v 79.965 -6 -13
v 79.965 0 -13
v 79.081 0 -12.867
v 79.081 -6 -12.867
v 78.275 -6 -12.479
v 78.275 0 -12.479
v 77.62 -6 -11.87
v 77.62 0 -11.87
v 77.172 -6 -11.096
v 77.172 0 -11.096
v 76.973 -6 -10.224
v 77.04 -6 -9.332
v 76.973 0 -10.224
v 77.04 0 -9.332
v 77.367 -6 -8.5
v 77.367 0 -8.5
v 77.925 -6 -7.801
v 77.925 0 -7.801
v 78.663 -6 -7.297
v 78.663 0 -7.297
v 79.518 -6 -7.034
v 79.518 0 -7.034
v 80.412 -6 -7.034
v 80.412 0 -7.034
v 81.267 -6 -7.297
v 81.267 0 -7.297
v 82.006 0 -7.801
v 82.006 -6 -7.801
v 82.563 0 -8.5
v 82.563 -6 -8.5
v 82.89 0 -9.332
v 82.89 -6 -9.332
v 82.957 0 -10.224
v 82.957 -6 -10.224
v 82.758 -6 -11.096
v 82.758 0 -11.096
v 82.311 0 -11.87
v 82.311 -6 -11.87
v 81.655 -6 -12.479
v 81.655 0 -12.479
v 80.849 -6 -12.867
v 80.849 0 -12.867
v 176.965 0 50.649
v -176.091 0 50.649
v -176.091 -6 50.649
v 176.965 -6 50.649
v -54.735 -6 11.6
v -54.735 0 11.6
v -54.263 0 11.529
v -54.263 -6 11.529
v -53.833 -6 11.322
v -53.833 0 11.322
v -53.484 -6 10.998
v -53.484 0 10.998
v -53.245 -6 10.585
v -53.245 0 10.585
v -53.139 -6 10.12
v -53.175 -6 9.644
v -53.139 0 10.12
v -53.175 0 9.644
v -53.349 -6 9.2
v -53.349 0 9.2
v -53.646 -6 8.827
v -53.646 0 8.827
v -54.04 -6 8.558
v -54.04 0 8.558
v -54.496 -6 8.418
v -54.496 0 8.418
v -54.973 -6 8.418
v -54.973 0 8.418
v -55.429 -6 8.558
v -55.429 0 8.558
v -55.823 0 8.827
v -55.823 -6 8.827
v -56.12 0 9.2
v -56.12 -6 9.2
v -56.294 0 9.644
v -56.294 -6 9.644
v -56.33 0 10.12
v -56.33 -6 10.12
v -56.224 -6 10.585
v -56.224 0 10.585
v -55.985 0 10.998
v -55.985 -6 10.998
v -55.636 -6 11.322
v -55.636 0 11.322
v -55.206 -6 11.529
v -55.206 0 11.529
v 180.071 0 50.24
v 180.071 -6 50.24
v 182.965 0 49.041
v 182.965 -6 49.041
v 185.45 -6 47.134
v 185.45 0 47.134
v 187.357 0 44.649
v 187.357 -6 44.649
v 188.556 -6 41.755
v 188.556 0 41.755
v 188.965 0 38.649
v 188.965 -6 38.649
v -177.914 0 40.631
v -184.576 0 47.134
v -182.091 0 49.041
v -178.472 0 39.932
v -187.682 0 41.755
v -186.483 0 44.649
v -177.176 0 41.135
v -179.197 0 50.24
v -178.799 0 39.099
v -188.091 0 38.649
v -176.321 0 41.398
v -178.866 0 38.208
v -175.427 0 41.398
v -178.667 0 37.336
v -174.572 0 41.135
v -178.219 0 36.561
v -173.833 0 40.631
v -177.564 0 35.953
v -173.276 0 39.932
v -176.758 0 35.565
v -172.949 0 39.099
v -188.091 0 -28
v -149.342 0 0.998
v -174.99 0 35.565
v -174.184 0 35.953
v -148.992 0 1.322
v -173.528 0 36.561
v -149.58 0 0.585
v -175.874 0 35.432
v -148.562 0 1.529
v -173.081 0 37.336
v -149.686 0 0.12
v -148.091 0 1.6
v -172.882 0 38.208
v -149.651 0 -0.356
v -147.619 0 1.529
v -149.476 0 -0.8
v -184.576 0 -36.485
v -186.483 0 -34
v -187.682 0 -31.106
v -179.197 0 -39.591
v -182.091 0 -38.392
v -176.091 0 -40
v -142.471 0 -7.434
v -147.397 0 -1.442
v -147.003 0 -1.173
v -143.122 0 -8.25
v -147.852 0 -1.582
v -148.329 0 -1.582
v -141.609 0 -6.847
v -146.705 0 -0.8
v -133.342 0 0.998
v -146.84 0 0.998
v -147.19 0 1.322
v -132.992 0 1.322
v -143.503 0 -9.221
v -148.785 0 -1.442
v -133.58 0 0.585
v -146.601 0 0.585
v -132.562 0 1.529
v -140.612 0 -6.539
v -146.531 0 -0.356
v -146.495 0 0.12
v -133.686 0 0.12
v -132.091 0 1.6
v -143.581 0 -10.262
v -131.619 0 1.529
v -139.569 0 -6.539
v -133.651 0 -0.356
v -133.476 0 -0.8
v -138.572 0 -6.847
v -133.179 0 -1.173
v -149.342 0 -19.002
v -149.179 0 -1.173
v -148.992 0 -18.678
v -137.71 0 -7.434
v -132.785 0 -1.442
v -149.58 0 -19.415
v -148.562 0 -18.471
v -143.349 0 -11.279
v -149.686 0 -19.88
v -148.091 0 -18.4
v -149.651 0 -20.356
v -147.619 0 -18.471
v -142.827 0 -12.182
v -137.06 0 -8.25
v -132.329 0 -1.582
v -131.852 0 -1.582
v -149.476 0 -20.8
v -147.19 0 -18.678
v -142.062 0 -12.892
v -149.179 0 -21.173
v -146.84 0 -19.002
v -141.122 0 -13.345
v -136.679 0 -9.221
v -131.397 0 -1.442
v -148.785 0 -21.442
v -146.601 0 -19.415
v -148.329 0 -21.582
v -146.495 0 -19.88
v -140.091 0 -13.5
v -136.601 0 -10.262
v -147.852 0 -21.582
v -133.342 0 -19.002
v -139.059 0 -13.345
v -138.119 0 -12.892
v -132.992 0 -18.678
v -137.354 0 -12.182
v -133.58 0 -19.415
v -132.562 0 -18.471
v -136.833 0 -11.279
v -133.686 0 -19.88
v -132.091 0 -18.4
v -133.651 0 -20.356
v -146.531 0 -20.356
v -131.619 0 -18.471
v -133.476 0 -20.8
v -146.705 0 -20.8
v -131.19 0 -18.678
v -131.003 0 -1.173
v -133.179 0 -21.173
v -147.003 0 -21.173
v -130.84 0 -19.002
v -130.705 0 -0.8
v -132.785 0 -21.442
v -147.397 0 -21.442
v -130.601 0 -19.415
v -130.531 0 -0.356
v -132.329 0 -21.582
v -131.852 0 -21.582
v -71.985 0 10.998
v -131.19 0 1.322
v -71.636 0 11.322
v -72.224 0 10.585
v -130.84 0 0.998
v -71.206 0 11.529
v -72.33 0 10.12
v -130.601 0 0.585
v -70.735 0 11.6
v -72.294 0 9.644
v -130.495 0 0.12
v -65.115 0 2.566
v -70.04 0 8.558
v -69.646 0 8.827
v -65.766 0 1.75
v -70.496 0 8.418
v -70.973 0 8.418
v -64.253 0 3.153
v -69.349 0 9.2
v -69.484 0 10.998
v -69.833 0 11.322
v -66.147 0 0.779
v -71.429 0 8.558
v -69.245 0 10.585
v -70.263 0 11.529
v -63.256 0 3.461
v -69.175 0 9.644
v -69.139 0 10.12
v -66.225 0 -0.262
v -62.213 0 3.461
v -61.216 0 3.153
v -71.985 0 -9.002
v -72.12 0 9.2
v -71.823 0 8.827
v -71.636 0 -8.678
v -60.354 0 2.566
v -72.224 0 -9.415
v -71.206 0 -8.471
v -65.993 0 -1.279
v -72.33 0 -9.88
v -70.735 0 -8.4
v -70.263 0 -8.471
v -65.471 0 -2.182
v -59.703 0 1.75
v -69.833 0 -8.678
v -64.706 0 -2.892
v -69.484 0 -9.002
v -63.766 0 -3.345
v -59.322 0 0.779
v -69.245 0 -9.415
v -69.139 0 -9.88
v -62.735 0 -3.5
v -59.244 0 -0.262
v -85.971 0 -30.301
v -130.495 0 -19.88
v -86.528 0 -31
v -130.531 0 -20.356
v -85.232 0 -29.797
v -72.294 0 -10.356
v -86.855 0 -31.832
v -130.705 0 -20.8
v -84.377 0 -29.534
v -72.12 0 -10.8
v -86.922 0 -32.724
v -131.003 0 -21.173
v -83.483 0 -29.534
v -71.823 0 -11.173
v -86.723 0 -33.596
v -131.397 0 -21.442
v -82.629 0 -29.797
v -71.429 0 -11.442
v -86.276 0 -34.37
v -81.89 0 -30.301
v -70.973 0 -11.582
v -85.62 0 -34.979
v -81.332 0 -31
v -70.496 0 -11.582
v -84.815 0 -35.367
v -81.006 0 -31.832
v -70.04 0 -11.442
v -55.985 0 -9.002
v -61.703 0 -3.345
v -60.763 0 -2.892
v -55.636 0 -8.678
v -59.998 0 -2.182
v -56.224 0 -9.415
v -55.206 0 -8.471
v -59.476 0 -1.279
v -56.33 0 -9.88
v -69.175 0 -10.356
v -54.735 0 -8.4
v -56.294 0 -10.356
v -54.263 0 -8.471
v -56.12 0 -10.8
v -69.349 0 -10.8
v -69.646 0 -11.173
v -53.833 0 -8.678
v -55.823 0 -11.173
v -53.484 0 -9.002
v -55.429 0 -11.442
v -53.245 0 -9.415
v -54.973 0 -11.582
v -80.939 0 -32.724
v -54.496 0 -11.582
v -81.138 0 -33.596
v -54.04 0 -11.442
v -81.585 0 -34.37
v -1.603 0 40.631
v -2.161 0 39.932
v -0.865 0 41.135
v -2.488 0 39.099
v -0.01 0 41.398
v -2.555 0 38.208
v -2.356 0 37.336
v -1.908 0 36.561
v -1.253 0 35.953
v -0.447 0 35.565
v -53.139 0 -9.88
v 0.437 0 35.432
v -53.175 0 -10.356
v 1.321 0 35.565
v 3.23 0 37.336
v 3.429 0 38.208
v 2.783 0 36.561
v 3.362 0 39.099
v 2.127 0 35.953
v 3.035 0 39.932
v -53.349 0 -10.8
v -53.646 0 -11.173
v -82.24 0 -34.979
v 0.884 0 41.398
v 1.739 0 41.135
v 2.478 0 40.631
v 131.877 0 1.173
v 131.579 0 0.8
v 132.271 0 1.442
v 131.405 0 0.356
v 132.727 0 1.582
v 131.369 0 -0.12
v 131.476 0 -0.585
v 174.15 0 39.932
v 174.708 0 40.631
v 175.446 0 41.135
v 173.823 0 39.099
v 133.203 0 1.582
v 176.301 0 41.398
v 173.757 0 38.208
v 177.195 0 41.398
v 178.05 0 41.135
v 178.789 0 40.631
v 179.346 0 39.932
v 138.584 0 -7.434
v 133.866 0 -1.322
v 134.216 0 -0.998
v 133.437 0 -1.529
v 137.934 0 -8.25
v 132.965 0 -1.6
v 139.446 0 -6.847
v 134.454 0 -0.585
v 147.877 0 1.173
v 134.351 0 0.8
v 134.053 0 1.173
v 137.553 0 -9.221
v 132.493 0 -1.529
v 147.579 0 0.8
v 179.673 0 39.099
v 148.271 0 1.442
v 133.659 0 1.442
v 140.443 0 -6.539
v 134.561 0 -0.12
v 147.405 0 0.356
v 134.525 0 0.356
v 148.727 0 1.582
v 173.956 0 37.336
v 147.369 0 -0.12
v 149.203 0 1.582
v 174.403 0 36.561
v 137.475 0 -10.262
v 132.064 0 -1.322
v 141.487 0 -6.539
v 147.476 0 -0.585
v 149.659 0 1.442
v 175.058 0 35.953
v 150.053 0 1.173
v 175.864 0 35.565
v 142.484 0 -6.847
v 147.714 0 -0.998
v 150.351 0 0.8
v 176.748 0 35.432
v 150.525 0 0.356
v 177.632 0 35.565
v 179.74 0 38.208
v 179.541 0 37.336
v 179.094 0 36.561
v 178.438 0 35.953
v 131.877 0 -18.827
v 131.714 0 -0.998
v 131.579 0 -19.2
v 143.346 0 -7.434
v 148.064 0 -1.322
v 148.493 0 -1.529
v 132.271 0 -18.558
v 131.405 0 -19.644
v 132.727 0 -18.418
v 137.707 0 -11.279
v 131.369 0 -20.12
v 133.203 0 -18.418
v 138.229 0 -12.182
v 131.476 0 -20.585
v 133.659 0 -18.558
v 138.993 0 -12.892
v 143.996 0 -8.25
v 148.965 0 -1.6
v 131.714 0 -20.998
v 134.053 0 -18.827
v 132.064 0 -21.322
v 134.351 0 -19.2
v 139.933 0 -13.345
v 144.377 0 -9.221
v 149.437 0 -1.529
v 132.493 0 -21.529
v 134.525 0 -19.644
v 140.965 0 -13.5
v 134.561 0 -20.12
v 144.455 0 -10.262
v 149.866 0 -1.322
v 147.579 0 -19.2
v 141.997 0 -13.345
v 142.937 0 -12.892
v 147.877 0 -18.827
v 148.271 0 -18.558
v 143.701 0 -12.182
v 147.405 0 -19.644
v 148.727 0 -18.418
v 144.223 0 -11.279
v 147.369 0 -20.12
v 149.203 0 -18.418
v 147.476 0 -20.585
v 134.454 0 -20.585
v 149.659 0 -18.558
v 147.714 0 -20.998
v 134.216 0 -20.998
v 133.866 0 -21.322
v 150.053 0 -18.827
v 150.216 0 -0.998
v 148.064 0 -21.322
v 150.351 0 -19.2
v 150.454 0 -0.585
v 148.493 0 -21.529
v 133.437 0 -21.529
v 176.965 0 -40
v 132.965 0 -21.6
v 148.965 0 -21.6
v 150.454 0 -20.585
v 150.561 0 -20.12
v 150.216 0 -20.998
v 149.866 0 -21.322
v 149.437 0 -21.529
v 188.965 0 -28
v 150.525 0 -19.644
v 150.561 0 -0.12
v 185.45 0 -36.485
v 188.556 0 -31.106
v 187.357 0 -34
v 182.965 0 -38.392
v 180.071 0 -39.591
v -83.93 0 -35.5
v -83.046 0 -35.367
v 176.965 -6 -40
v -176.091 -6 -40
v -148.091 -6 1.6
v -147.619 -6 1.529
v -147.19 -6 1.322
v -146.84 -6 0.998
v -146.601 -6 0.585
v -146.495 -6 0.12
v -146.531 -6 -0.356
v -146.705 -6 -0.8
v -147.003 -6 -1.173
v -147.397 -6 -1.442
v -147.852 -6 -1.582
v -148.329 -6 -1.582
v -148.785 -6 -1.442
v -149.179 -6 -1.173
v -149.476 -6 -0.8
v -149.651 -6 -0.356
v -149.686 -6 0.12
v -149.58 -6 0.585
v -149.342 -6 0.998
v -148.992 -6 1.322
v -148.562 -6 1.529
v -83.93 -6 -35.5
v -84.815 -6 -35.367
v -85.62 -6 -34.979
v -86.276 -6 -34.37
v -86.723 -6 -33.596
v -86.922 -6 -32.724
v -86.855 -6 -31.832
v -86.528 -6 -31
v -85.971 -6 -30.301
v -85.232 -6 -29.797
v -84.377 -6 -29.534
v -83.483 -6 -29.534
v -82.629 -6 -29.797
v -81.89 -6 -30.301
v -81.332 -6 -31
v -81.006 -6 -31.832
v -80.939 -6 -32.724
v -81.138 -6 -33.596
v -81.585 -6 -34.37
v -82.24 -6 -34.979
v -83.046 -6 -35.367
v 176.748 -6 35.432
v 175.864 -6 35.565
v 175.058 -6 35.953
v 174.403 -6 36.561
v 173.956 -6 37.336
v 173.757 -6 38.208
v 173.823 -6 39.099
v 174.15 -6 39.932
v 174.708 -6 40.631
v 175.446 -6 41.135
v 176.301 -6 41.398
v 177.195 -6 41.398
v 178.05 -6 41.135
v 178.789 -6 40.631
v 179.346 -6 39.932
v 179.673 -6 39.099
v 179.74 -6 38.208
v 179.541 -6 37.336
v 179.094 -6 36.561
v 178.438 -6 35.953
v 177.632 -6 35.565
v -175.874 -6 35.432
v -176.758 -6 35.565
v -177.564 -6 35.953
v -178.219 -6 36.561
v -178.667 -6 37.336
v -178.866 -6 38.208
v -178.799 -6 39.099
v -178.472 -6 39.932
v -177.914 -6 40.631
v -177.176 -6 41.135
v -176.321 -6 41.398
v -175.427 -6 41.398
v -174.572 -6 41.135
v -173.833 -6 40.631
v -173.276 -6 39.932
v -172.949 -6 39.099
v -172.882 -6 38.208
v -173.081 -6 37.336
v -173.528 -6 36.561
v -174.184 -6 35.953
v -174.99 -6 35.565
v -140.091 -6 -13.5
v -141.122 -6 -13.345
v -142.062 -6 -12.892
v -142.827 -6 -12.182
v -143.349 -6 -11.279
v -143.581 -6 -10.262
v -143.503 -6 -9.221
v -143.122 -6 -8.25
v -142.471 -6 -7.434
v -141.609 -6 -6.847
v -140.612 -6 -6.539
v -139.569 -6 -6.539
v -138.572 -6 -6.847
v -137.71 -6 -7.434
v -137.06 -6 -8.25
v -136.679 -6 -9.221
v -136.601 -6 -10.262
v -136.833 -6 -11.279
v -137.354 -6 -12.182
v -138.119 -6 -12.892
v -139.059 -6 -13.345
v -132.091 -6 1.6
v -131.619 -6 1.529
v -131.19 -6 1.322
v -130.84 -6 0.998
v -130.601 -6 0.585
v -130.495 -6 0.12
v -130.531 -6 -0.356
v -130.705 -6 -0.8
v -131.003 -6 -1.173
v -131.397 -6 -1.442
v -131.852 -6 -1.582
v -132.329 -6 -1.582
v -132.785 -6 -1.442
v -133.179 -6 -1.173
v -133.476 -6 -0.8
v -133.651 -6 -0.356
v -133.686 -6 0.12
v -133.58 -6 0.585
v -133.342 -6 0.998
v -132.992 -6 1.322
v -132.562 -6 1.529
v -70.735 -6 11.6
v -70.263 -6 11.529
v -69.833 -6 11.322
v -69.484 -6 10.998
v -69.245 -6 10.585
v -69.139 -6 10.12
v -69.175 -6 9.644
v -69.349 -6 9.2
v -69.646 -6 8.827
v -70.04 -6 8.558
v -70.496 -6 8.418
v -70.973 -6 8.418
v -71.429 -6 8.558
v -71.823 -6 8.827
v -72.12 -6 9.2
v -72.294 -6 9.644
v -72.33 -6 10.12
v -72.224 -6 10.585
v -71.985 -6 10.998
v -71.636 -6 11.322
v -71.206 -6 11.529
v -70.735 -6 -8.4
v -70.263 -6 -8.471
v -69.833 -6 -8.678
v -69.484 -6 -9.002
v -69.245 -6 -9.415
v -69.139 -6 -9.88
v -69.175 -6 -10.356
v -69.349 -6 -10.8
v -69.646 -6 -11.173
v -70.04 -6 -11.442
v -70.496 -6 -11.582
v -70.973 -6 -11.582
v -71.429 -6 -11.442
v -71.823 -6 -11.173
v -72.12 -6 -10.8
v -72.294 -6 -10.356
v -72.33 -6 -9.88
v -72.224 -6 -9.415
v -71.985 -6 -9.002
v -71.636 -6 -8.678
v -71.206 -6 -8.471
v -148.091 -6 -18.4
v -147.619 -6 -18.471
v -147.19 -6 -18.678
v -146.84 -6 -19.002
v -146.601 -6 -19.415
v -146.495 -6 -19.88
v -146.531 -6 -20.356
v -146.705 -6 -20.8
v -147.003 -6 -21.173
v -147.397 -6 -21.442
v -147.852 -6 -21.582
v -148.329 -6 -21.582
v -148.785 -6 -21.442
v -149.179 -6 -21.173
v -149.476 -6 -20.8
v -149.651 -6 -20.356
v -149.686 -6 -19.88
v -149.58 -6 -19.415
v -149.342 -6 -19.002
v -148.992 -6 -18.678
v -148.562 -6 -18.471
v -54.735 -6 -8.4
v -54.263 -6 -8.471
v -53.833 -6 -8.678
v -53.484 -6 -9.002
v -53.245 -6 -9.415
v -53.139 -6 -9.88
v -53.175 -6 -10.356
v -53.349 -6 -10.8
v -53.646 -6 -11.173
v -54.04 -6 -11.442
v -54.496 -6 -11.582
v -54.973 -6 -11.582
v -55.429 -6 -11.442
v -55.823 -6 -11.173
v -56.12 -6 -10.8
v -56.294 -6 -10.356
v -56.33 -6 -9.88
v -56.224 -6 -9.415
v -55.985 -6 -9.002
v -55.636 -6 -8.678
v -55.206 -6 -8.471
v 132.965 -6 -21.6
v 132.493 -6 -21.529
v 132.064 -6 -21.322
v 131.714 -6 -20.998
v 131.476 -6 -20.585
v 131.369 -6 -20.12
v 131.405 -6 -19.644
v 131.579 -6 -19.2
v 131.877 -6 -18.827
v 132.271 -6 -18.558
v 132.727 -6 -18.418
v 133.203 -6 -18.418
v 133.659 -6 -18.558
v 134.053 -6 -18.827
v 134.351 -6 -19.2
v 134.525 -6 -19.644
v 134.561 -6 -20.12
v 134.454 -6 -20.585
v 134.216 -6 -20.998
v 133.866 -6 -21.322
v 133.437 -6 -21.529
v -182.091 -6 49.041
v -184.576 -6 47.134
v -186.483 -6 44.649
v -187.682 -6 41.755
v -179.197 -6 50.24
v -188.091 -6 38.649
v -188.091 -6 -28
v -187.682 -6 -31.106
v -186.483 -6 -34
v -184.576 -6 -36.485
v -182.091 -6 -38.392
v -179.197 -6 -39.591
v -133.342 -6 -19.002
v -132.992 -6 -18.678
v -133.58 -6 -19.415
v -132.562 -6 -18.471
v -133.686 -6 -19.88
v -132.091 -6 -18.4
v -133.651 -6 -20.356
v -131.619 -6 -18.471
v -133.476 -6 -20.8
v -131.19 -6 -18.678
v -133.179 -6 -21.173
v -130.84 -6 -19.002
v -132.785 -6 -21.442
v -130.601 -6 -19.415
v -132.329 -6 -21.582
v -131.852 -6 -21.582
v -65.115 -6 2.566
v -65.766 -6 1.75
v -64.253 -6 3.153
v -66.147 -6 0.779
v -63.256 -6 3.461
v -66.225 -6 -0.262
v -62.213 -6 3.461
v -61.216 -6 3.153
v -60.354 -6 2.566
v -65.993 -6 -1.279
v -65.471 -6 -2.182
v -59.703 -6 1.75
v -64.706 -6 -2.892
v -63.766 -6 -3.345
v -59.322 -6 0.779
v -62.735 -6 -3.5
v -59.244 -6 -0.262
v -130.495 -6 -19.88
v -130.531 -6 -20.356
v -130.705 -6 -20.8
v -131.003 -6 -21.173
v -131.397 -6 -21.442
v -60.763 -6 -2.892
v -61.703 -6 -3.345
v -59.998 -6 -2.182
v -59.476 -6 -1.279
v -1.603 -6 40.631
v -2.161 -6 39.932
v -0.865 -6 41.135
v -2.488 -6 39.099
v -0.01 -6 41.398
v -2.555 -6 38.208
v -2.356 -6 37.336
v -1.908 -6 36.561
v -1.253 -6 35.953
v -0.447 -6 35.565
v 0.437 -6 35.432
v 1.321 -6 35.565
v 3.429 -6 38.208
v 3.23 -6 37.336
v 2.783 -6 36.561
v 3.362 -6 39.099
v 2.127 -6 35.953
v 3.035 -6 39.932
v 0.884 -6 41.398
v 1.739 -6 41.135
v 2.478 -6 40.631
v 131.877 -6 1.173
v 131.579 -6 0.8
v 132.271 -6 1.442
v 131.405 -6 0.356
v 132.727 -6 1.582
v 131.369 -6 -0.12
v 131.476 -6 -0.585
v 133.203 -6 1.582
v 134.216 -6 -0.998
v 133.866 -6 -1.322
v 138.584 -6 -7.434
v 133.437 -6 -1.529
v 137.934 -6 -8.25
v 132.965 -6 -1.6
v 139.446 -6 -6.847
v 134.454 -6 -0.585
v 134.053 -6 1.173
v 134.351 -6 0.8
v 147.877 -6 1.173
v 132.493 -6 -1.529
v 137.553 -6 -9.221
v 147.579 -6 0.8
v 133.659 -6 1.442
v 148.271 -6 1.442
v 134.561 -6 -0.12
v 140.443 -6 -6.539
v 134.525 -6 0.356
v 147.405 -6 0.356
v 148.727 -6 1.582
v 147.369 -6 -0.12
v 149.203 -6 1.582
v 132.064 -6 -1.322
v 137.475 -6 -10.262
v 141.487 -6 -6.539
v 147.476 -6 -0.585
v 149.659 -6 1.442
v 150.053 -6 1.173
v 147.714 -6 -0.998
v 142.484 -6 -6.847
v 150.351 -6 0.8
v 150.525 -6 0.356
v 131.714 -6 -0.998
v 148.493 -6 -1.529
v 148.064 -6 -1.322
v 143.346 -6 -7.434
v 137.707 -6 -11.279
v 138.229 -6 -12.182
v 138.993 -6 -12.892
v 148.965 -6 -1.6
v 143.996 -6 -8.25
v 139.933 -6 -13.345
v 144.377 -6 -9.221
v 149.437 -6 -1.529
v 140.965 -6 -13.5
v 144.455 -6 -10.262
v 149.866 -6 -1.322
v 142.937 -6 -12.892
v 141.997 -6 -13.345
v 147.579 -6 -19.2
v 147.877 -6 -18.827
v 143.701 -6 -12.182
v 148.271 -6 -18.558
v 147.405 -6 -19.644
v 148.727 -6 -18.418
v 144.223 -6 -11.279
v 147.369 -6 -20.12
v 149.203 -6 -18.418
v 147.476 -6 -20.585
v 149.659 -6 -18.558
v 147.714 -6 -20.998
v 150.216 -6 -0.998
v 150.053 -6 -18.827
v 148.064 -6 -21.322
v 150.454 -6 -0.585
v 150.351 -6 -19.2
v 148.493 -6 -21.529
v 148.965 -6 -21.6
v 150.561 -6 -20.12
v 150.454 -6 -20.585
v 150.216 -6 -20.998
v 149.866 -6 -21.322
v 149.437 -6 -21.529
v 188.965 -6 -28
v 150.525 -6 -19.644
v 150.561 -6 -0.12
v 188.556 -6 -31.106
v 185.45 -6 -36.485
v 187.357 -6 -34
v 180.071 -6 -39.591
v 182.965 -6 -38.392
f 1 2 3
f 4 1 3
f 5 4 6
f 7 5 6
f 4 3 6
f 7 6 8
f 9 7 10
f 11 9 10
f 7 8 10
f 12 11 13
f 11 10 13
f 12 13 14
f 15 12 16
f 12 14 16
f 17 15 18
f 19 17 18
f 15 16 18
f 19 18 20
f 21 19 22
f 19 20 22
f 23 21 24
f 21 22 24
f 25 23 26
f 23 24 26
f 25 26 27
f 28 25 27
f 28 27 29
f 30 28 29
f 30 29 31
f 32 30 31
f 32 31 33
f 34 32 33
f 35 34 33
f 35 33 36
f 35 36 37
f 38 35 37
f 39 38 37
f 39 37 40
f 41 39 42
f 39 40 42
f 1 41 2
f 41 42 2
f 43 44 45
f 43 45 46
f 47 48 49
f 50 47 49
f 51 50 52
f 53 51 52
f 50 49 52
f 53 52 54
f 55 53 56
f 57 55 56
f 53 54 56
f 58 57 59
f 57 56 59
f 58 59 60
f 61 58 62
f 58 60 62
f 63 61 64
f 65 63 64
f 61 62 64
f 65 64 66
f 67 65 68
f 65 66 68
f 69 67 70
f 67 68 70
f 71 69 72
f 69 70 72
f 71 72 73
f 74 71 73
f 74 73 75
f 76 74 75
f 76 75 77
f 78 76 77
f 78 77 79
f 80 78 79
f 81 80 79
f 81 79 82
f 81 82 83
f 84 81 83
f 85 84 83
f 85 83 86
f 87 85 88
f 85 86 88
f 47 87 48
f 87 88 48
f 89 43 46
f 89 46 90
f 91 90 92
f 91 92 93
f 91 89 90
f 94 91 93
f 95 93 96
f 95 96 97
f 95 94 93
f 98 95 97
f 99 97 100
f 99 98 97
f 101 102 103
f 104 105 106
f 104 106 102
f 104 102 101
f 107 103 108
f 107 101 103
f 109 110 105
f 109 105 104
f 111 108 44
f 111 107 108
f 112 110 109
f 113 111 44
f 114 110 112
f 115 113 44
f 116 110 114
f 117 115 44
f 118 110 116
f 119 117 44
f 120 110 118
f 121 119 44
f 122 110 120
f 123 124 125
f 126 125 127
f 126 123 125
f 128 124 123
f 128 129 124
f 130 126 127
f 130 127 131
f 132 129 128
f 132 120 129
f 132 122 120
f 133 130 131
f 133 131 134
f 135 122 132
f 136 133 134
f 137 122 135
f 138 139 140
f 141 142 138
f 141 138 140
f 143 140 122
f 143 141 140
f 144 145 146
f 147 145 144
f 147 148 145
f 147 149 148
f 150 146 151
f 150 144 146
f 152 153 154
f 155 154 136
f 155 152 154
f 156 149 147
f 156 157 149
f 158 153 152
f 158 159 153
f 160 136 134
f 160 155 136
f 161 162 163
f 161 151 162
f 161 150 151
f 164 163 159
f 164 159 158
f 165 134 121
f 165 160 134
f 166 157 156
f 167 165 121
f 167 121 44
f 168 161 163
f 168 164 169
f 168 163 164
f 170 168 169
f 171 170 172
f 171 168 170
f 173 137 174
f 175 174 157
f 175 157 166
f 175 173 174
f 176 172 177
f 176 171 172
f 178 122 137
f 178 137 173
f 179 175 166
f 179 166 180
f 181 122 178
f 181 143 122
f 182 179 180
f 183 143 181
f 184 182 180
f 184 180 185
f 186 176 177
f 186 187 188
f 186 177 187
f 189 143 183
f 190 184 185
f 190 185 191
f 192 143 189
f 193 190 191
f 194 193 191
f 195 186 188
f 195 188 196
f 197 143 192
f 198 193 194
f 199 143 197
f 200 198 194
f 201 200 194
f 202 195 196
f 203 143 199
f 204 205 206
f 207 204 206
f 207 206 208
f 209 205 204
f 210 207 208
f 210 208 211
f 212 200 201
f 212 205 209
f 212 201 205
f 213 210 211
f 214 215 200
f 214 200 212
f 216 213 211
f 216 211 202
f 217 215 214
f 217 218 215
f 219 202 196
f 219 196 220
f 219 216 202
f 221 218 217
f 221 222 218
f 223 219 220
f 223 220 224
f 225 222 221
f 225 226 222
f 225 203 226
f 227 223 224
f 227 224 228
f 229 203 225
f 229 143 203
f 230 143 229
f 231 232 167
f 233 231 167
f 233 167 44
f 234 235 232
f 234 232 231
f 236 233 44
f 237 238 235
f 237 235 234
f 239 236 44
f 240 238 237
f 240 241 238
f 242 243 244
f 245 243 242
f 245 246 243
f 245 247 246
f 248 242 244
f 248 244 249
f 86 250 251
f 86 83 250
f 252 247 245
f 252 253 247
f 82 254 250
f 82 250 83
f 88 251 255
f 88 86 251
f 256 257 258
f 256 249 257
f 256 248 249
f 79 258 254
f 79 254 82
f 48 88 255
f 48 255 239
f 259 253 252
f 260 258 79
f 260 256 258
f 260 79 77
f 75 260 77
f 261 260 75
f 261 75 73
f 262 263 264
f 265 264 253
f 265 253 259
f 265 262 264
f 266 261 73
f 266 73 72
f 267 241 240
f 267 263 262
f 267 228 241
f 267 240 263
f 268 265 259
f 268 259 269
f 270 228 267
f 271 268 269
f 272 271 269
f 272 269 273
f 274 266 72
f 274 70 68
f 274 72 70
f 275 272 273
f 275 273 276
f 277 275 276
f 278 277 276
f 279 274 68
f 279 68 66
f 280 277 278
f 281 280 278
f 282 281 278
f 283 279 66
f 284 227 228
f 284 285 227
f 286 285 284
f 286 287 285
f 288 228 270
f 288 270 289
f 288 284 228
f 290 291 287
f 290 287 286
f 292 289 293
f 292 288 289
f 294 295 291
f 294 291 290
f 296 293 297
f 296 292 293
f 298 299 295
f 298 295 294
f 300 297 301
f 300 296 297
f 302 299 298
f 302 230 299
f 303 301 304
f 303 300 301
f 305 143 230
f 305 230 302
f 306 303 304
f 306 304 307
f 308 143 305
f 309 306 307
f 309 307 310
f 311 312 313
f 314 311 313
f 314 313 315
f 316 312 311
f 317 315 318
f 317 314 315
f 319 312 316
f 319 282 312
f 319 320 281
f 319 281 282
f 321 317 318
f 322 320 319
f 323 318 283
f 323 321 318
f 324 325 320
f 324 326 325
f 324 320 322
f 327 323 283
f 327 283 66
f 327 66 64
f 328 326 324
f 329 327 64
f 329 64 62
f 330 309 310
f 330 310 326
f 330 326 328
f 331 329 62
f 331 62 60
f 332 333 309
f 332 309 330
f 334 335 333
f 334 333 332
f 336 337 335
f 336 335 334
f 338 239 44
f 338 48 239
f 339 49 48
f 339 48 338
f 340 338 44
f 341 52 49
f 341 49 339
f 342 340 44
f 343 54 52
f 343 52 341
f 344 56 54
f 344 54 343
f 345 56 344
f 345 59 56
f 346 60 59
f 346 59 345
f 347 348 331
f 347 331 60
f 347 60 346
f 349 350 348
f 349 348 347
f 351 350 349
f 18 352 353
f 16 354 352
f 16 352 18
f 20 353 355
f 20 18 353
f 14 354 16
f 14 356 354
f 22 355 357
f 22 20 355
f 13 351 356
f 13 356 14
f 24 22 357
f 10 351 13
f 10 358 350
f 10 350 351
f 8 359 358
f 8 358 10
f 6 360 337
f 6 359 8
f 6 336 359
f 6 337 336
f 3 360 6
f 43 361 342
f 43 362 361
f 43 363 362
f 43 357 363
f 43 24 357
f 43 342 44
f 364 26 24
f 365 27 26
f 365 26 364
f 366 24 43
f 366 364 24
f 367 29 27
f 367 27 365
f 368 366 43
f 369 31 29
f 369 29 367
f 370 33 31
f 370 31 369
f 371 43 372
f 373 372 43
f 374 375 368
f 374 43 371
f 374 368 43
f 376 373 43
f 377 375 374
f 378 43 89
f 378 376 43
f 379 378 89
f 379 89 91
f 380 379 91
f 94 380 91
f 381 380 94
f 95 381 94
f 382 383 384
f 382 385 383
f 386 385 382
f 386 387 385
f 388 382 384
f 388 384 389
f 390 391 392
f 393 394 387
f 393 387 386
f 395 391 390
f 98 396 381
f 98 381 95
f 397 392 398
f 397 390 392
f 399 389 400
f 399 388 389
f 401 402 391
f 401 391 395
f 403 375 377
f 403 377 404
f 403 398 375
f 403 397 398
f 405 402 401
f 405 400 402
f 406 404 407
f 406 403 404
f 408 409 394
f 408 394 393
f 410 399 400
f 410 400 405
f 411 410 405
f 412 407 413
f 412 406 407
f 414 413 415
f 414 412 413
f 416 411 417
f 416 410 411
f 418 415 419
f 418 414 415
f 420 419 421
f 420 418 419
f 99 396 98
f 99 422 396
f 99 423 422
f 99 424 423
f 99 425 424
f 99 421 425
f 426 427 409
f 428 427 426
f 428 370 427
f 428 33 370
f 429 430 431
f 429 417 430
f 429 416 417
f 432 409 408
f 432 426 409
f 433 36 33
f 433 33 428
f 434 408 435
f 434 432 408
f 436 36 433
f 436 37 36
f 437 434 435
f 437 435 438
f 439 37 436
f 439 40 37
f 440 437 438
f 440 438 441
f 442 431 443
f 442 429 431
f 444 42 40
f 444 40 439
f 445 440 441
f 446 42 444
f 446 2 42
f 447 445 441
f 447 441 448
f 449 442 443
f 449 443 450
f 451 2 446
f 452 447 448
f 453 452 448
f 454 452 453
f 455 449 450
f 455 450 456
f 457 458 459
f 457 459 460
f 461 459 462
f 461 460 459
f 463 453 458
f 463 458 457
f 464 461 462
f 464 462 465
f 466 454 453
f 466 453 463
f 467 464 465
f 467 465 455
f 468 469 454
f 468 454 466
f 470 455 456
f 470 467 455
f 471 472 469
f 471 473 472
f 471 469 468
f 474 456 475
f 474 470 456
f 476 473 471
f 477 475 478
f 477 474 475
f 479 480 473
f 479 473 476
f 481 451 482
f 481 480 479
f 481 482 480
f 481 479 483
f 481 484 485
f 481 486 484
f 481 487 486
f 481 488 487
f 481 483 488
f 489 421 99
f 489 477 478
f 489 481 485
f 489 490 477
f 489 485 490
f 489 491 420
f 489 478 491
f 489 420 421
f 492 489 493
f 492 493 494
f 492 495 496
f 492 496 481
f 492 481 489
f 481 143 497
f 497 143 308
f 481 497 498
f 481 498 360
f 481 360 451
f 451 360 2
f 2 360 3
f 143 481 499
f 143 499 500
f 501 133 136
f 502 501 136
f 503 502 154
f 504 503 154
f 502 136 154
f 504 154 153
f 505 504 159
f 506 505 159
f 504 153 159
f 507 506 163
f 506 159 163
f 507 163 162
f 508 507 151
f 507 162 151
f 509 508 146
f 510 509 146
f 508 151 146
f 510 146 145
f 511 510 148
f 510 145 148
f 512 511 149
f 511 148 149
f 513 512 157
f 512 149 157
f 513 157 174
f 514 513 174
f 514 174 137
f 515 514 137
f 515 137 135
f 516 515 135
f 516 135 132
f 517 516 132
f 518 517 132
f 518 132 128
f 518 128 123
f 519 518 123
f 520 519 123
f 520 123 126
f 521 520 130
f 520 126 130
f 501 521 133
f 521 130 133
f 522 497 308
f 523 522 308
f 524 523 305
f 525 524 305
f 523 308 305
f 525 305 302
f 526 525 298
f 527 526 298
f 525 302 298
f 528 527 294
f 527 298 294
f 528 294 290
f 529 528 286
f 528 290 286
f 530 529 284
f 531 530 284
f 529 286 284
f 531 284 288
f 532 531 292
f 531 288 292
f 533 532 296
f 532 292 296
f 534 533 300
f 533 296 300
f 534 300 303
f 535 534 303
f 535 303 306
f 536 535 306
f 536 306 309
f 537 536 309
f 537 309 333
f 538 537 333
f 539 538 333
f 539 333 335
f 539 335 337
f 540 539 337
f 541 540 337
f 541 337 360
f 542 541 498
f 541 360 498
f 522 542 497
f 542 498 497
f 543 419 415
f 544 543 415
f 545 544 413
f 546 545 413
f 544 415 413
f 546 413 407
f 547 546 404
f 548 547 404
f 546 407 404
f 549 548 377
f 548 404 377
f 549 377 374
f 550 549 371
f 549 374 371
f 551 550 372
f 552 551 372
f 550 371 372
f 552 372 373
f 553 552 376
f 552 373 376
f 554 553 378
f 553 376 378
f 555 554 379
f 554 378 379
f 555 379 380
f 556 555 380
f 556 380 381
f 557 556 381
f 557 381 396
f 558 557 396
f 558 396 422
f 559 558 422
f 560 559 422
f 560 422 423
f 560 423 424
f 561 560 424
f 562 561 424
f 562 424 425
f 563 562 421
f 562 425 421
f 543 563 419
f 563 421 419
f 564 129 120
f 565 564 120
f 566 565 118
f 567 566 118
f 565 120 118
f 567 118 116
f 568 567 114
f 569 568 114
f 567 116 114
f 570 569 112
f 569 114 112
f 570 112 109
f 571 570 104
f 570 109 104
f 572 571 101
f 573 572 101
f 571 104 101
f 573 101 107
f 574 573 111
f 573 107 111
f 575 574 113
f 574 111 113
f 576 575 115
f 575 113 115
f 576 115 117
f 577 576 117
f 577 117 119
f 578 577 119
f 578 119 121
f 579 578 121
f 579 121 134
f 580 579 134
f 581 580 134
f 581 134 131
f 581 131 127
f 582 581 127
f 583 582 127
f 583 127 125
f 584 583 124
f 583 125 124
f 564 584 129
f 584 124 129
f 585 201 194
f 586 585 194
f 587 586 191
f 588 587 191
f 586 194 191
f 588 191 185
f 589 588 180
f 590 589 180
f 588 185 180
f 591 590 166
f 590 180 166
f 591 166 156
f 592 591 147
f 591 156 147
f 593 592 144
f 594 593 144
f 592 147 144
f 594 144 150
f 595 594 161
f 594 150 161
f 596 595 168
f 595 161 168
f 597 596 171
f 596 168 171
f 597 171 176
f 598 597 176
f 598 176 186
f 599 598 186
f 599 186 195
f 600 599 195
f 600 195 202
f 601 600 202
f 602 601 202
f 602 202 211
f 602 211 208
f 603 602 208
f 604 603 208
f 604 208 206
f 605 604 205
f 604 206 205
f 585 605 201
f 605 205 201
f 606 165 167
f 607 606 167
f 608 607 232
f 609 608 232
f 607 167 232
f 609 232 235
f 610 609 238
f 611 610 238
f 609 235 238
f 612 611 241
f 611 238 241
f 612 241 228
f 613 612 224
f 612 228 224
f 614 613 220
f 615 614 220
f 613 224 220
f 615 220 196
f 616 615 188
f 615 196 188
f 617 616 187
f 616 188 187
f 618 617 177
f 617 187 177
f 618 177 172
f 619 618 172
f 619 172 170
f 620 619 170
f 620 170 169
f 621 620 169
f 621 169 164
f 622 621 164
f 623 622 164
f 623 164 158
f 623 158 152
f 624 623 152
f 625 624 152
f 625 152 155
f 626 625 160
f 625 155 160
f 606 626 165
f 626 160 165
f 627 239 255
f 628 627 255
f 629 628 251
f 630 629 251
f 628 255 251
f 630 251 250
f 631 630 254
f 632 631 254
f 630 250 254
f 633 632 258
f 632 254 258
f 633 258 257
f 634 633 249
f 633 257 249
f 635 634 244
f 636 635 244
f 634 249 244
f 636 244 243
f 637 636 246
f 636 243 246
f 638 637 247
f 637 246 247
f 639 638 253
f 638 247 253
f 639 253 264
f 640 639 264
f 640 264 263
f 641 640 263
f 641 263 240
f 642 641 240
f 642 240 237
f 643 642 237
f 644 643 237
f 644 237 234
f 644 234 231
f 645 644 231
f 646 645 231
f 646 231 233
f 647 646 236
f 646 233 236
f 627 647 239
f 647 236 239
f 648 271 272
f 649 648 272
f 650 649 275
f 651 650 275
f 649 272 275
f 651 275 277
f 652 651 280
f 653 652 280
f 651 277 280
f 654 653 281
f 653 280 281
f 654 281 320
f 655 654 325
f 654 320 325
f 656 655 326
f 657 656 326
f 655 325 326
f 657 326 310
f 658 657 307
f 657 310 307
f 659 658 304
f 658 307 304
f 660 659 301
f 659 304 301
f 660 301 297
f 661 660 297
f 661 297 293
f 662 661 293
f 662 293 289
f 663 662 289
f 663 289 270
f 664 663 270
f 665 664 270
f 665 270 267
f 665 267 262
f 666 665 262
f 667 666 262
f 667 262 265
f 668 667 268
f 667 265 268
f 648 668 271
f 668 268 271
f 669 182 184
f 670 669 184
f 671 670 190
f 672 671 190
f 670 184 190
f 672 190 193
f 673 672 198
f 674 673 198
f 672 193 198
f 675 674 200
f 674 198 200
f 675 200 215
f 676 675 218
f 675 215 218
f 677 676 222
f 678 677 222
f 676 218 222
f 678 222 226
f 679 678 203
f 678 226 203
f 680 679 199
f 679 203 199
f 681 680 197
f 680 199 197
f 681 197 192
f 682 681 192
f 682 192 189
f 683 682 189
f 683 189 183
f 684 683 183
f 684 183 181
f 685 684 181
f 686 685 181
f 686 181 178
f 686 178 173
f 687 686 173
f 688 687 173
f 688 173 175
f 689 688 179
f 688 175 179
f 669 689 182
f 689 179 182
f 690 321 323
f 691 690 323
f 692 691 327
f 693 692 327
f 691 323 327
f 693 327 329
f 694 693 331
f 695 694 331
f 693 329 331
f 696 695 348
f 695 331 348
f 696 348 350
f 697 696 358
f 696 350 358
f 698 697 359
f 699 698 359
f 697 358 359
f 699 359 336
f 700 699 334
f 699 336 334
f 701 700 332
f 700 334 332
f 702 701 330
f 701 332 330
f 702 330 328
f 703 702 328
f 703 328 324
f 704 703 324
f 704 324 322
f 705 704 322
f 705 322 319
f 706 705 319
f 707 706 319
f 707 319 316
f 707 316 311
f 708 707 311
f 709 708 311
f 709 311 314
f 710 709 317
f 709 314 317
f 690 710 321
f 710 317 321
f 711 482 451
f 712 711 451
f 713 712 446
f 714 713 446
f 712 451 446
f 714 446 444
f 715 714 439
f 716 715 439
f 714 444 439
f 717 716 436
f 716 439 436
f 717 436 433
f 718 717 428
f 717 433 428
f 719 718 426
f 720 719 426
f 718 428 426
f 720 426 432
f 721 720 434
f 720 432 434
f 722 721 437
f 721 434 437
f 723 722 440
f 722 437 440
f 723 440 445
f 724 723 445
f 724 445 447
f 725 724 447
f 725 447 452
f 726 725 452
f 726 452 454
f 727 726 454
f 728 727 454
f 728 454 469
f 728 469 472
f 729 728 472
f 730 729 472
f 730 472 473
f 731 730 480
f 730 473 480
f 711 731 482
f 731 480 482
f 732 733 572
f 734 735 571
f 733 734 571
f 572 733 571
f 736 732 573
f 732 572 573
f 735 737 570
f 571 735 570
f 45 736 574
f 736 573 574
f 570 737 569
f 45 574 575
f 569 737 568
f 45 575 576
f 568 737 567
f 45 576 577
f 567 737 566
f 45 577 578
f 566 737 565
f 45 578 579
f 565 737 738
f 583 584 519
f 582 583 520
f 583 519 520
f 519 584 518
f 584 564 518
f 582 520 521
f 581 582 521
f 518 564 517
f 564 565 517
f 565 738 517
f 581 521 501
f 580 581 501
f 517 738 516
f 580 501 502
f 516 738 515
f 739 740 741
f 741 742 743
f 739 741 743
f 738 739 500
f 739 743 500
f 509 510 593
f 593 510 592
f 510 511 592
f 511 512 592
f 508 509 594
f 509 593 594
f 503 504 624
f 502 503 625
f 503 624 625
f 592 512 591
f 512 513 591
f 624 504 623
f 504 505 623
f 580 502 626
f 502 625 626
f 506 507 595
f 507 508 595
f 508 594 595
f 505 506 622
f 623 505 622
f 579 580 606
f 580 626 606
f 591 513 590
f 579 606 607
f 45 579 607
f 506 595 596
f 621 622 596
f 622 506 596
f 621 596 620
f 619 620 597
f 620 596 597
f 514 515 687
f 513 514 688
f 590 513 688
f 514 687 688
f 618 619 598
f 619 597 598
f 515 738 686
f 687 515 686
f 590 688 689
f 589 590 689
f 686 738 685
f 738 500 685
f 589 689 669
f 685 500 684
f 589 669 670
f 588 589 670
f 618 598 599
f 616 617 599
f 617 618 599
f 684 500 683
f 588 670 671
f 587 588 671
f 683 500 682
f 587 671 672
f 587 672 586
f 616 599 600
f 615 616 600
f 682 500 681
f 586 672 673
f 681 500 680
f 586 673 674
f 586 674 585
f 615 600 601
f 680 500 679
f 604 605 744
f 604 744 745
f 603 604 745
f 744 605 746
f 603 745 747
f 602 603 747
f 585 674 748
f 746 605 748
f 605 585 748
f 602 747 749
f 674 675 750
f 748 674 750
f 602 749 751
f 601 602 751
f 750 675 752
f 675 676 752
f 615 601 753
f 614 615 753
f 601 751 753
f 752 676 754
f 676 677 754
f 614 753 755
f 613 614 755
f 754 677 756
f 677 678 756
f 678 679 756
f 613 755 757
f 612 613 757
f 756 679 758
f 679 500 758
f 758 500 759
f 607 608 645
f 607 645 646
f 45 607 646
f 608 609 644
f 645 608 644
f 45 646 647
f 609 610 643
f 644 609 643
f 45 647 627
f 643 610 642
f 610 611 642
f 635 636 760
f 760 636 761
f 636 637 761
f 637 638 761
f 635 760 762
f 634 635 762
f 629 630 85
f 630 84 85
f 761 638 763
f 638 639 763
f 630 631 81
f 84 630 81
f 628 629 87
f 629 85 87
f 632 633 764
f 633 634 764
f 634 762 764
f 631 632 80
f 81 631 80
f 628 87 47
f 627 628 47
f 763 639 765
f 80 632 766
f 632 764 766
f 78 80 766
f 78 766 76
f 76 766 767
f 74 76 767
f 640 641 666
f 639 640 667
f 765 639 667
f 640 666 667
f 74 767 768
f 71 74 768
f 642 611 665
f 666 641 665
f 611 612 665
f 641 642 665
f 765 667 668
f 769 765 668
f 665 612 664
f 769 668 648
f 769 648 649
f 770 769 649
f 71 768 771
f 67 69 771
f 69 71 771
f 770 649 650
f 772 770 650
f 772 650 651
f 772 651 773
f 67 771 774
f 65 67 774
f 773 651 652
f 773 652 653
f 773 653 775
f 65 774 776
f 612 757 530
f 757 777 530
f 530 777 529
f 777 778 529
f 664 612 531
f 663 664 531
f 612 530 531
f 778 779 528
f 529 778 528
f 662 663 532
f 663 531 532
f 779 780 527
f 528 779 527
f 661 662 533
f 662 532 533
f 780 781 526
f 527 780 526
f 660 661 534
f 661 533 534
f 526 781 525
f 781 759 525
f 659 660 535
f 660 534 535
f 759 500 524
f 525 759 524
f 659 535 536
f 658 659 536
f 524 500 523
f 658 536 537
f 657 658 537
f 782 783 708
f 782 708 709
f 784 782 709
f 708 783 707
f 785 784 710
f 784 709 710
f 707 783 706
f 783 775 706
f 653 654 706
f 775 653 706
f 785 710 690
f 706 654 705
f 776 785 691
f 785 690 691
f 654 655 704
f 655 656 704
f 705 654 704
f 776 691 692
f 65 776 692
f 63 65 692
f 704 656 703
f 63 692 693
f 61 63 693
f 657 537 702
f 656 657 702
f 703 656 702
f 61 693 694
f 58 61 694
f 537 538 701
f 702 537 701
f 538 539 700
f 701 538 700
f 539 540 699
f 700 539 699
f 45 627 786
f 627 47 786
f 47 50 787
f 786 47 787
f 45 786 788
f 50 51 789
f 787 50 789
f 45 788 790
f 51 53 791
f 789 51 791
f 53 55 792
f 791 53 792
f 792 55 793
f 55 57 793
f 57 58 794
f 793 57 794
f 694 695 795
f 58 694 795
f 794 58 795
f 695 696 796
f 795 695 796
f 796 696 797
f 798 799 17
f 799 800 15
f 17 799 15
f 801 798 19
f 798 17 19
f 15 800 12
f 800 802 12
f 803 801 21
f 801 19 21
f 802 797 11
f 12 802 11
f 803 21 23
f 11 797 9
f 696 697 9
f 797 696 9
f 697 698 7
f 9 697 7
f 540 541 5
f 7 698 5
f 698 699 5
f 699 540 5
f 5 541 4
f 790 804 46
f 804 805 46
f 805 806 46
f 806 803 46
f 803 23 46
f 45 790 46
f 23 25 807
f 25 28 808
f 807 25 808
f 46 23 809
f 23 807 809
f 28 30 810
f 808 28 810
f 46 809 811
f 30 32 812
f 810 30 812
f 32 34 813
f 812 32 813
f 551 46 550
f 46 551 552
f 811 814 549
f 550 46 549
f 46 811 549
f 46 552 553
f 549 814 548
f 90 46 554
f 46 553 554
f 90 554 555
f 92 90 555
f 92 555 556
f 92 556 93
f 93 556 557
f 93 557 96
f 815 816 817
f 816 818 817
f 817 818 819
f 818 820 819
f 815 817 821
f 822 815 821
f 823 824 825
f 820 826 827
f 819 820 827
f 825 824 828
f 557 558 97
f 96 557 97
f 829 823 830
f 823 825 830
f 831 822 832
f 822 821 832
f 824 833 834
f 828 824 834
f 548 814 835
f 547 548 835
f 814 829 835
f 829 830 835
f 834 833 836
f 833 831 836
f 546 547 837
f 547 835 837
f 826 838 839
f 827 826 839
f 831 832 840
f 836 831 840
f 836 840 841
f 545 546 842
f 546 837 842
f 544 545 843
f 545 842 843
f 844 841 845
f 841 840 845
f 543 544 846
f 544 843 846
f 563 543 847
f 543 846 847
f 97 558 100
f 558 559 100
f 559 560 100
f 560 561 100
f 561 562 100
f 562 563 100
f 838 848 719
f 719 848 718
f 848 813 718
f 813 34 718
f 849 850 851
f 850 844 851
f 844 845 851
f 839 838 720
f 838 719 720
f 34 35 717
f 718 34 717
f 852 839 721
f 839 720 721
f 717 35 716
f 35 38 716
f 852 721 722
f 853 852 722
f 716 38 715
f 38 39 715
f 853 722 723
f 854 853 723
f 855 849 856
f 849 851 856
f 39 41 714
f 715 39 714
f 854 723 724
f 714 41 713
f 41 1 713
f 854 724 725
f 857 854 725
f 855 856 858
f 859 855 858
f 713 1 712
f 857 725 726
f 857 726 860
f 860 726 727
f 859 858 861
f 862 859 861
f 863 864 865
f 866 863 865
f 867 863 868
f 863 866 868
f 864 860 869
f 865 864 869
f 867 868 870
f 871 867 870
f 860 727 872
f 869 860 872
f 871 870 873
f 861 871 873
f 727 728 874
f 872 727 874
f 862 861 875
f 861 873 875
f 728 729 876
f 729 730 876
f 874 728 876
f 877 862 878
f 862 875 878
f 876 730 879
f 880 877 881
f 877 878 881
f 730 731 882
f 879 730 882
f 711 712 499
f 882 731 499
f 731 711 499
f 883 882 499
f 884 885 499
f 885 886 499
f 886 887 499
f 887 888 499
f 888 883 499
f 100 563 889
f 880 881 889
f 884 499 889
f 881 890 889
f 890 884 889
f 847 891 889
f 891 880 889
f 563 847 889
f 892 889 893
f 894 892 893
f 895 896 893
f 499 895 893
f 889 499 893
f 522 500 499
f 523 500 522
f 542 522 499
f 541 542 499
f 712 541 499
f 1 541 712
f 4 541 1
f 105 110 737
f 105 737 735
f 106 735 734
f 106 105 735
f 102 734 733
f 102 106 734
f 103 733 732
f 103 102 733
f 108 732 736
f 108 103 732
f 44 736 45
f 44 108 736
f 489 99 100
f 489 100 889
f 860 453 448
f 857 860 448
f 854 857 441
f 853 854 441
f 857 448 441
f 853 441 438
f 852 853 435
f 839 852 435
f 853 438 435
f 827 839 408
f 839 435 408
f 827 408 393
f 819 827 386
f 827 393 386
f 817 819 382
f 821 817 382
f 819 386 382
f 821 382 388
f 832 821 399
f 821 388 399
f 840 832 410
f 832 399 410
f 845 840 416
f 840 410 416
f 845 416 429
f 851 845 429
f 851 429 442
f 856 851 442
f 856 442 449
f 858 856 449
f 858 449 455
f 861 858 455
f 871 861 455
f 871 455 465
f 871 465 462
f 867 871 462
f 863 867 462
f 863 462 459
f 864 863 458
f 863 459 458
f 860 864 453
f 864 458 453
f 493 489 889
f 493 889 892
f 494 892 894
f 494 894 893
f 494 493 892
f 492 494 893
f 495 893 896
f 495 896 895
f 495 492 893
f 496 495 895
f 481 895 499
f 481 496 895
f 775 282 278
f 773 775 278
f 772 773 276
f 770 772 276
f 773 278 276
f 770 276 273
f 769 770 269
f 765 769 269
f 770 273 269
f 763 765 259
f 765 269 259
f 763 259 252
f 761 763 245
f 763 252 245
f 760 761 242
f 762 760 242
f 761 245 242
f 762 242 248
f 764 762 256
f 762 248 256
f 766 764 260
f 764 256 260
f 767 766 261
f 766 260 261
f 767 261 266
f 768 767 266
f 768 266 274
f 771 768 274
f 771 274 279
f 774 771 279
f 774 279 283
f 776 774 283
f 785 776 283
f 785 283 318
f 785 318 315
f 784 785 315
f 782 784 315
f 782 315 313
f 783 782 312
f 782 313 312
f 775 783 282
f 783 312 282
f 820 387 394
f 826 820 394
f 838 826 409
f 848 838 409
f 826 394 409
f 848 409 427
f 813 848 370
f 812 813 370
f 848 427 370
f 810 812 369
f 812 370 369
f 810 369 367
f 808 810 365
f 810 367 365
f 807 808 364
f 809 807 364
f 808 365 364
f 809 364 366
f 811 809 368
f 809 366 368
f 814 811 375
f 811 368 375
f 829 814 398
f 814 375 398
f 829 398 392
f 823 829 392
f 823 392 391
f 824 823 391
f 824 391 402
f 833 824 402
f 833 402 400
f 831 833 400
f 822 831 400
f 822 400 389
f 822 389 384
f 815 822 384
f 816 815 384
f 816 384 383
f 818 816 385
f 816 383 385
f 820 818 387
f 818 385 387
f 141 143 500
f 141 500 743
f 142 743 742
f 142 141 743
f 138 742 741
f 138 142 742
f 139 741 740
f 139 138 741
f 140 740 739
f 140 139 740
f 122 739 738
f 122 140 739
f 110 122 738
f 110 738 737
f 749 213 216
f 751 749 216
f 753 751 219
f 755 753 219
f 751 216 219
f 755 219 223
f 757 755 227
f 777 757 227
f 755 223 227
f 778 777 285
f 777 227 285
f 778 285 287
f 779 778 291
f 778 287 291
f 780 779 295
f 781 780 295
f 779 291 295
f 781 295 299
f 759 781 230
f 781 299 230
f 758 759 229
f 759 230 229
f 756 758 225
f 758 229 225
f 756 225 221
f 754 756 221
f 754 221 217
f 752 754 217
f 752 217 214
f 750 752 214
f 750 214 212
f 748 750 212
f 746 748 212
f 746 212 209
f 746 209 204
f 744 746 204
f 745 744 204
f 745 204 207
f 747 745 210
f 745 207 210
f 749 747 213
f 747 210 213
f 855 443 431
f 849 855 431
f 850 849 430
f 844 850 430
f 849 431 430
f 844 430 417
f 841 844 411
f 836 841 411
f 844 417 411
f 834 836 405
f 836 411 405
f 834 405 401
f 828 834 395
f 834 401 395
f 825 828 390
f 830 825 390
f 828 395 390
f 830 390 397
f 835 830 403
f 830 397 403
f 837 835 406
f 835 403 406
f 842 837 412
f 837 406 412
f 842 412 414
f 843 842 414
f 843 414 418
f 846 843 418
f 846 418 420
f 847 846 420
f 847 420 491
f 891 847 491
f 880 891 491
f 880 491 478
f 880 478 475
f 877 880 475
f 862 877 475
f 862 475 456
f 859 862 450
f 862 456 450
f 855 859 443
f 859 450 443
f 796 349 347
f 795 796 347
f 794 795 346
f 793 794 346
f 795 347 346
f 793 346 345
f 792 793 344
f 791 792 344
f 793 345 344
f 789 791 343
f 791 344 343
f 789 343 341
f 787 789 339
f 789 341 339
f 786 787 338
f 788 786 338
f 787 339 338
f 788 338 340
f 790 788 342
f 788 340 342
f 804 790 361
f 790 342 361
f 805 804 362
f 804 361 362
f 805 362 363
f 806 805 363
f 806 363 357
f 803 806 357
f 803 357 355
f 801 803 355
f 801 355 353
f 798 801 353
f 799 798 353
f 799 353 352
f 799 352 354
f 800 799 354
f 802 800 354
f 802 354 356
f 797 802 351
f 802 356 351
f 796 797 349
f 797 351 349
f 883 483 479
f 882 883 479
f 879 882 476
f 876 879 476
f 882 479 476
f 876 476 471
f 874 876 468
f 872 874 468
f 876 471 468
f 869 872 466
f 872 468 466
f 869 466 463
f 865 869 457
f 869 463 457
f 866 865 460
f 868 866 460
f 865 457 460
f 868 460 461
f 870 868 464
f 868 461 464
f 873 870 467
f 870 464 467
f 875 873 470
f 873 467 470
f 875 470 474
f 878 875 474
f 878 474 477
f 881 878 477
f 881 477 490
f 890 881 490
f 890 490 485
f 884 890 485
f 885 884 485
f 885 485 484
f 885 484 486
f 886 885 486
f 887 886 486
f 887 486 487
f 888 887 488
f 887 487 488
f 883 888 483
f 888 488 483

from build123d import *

# Parameters (mm, degrees)
ESBO_O1_R                = 3.5
ESBO_O1_R_2              = 3
ESBO_O1_R_3              = 1.6
RESSALTO_EXTRUS_O1_DEPTH = 6


with BuildPart() as part:
    # Esboço1 → Ressalto-extrusão1 (new body)
    with BuildSketch(Plane(origin=(0, 0, 0), x_dir=(1, 0, 0), z_dir=(0, 1, 0))):
        with BuildLine():
            Line((188.965018959, -38.648697641), (188.965018959, 28))
            ThreePointArc((188.965018959, 28), (185.450300333, 36.485281374), (176.965018959, 40))
            Line((176.965018959, 40), (-176.090826953, 40))
            ThreePointArc((-176.090826953, 40), (-184.576108327, 36.485281374), (-188.090826953, 28))
            Line((-188.090826953, 28), (-188.090826953, -38.648697641))
            ThreePointArc((-188.090826953, -38.648697641), (-184.576108327, -47.133979015), (-176.090826953, -50.648697641))
            Line((-176.090826953, -50.648697641), (176.965018959, -50.648697641))
            ThreePointArc((176.965018959, -50.648697641), (185.450300333, -47.133979015), (188.965018959, -38.648697641))
        make_face()
        with Locations(Location((-62.734509176, 0, 0), (0, 0, 90))):
            Circle(ESBO_O1_R, mode=Mode.SUBTRACT)
        with Locations(Location((176.748138959, -38.431817641, 0), (0, 0, 90))):
            Circle(ESBO_O1_R_2, mode=Mode.SUBTRACT)
        with Locations(Location((0.437096003, -38.431817641, 0), (0, 0, 90))):
            Circle(ESBO_O1_R_2, mode=Mode.SUBTRACT)
        with Locations(Location((79.965018959, 10, 0), (0, 0, 90))):
            Circle(ESBO_O1_R_2, mode=Mode.SUBTRACT)
        with Locations(Location((-140.090826953, 10, 0), (0, 0, 90))):
            Circle(ESBO_O1_R, mode=Mode.SUBTRACT)
        with Locations(Location((-148.090826953, 0, 0), (0, 0, 270))):
            Circle(ESBO_O1_R_3, mode=Mode.SUBTRACT)
        with Locations(Location((-132.090826953, 0, 0), (0, 0, 270))):
            Circle(ESBO_O1_R_3, mode=Mode.SUBTRACT)
        with Locations(Location((-132.090826953, 20, 0), (0, 0, 270))):
            Circle(ESBO_O1_R_3, mode=Mode.SUBTRACT)
        with Locations(Location((-148.090826953, 20, 0), (0, 0, 270))):
            Circle(ESBO_O1_R_3, mode=Mode.SUBTRACT)
        with Locations(Location((-70.734509176, -10, 0), (0, 0, 270))):
            Circle(ESBO_O1_R_3, mode=Mode.SUBTRACT)
        with Locations(Location((-70.734509176, 10, 0), (0, 0, 270))):
            Circle(ESBO_O1_R_3, mode=Mode.SUBTRACT)
        with Locations(Location((-54.734509176, 10, 0), (0, 0, 270))):
            Circle(ESBO_O1_R_3, mode=Mode.SUBTRACT)
        with Locations(Location((-54.734509176, -10, 0), (0, 0, 270))):
            Circle(ESBO_O1_R_3, mode=Mode.SUBTRACT)
        with Locations(Location((-83.930342624, 32.5, 0), (0, 0, 90))):
            Circle(ESBO_O1_R_2, mode=Mode.SUBTRACT)
        with Locations(Location((-175.873946953, -38.431817641, 0), (0, 0, 90))):
            Circle(ESBO_O1_R_2, mode=Mode.SUBTRACT)
        with Locations(Location((140.965018959, 10, 0), (0, 0, 90))):
            Circle(ESBO_O1_R, mode=Mode.SUBTRACT)
        with Locations(Location((148.965018959, 0, 0), (0, 0, 90))):
            Circle(ESBO_O1_R_3, mode=Mode.SUBTRACT)
        with Locations(Location((148.965018959, 20, 0), (0, 0, 90))):
            Circle(ESBO_O1_R_3, mode=Mode.SUBTRACT)
        with Locations(Location((132.965018959, 0, 0), (0, 0, 90))):
            Circle(ESBO_O1_R_3, mode=Mode.SUBTRACT)
        with Locations(Location((132.965018959, 20, 0), (0, 0, 90))):
            Circle(ESBO_O1_R_3, mode=Mode.SUBTRACT)
    extrude(amount=-RESSALTO_EXTRUS_O1_DEPTH)


solid = part.part
